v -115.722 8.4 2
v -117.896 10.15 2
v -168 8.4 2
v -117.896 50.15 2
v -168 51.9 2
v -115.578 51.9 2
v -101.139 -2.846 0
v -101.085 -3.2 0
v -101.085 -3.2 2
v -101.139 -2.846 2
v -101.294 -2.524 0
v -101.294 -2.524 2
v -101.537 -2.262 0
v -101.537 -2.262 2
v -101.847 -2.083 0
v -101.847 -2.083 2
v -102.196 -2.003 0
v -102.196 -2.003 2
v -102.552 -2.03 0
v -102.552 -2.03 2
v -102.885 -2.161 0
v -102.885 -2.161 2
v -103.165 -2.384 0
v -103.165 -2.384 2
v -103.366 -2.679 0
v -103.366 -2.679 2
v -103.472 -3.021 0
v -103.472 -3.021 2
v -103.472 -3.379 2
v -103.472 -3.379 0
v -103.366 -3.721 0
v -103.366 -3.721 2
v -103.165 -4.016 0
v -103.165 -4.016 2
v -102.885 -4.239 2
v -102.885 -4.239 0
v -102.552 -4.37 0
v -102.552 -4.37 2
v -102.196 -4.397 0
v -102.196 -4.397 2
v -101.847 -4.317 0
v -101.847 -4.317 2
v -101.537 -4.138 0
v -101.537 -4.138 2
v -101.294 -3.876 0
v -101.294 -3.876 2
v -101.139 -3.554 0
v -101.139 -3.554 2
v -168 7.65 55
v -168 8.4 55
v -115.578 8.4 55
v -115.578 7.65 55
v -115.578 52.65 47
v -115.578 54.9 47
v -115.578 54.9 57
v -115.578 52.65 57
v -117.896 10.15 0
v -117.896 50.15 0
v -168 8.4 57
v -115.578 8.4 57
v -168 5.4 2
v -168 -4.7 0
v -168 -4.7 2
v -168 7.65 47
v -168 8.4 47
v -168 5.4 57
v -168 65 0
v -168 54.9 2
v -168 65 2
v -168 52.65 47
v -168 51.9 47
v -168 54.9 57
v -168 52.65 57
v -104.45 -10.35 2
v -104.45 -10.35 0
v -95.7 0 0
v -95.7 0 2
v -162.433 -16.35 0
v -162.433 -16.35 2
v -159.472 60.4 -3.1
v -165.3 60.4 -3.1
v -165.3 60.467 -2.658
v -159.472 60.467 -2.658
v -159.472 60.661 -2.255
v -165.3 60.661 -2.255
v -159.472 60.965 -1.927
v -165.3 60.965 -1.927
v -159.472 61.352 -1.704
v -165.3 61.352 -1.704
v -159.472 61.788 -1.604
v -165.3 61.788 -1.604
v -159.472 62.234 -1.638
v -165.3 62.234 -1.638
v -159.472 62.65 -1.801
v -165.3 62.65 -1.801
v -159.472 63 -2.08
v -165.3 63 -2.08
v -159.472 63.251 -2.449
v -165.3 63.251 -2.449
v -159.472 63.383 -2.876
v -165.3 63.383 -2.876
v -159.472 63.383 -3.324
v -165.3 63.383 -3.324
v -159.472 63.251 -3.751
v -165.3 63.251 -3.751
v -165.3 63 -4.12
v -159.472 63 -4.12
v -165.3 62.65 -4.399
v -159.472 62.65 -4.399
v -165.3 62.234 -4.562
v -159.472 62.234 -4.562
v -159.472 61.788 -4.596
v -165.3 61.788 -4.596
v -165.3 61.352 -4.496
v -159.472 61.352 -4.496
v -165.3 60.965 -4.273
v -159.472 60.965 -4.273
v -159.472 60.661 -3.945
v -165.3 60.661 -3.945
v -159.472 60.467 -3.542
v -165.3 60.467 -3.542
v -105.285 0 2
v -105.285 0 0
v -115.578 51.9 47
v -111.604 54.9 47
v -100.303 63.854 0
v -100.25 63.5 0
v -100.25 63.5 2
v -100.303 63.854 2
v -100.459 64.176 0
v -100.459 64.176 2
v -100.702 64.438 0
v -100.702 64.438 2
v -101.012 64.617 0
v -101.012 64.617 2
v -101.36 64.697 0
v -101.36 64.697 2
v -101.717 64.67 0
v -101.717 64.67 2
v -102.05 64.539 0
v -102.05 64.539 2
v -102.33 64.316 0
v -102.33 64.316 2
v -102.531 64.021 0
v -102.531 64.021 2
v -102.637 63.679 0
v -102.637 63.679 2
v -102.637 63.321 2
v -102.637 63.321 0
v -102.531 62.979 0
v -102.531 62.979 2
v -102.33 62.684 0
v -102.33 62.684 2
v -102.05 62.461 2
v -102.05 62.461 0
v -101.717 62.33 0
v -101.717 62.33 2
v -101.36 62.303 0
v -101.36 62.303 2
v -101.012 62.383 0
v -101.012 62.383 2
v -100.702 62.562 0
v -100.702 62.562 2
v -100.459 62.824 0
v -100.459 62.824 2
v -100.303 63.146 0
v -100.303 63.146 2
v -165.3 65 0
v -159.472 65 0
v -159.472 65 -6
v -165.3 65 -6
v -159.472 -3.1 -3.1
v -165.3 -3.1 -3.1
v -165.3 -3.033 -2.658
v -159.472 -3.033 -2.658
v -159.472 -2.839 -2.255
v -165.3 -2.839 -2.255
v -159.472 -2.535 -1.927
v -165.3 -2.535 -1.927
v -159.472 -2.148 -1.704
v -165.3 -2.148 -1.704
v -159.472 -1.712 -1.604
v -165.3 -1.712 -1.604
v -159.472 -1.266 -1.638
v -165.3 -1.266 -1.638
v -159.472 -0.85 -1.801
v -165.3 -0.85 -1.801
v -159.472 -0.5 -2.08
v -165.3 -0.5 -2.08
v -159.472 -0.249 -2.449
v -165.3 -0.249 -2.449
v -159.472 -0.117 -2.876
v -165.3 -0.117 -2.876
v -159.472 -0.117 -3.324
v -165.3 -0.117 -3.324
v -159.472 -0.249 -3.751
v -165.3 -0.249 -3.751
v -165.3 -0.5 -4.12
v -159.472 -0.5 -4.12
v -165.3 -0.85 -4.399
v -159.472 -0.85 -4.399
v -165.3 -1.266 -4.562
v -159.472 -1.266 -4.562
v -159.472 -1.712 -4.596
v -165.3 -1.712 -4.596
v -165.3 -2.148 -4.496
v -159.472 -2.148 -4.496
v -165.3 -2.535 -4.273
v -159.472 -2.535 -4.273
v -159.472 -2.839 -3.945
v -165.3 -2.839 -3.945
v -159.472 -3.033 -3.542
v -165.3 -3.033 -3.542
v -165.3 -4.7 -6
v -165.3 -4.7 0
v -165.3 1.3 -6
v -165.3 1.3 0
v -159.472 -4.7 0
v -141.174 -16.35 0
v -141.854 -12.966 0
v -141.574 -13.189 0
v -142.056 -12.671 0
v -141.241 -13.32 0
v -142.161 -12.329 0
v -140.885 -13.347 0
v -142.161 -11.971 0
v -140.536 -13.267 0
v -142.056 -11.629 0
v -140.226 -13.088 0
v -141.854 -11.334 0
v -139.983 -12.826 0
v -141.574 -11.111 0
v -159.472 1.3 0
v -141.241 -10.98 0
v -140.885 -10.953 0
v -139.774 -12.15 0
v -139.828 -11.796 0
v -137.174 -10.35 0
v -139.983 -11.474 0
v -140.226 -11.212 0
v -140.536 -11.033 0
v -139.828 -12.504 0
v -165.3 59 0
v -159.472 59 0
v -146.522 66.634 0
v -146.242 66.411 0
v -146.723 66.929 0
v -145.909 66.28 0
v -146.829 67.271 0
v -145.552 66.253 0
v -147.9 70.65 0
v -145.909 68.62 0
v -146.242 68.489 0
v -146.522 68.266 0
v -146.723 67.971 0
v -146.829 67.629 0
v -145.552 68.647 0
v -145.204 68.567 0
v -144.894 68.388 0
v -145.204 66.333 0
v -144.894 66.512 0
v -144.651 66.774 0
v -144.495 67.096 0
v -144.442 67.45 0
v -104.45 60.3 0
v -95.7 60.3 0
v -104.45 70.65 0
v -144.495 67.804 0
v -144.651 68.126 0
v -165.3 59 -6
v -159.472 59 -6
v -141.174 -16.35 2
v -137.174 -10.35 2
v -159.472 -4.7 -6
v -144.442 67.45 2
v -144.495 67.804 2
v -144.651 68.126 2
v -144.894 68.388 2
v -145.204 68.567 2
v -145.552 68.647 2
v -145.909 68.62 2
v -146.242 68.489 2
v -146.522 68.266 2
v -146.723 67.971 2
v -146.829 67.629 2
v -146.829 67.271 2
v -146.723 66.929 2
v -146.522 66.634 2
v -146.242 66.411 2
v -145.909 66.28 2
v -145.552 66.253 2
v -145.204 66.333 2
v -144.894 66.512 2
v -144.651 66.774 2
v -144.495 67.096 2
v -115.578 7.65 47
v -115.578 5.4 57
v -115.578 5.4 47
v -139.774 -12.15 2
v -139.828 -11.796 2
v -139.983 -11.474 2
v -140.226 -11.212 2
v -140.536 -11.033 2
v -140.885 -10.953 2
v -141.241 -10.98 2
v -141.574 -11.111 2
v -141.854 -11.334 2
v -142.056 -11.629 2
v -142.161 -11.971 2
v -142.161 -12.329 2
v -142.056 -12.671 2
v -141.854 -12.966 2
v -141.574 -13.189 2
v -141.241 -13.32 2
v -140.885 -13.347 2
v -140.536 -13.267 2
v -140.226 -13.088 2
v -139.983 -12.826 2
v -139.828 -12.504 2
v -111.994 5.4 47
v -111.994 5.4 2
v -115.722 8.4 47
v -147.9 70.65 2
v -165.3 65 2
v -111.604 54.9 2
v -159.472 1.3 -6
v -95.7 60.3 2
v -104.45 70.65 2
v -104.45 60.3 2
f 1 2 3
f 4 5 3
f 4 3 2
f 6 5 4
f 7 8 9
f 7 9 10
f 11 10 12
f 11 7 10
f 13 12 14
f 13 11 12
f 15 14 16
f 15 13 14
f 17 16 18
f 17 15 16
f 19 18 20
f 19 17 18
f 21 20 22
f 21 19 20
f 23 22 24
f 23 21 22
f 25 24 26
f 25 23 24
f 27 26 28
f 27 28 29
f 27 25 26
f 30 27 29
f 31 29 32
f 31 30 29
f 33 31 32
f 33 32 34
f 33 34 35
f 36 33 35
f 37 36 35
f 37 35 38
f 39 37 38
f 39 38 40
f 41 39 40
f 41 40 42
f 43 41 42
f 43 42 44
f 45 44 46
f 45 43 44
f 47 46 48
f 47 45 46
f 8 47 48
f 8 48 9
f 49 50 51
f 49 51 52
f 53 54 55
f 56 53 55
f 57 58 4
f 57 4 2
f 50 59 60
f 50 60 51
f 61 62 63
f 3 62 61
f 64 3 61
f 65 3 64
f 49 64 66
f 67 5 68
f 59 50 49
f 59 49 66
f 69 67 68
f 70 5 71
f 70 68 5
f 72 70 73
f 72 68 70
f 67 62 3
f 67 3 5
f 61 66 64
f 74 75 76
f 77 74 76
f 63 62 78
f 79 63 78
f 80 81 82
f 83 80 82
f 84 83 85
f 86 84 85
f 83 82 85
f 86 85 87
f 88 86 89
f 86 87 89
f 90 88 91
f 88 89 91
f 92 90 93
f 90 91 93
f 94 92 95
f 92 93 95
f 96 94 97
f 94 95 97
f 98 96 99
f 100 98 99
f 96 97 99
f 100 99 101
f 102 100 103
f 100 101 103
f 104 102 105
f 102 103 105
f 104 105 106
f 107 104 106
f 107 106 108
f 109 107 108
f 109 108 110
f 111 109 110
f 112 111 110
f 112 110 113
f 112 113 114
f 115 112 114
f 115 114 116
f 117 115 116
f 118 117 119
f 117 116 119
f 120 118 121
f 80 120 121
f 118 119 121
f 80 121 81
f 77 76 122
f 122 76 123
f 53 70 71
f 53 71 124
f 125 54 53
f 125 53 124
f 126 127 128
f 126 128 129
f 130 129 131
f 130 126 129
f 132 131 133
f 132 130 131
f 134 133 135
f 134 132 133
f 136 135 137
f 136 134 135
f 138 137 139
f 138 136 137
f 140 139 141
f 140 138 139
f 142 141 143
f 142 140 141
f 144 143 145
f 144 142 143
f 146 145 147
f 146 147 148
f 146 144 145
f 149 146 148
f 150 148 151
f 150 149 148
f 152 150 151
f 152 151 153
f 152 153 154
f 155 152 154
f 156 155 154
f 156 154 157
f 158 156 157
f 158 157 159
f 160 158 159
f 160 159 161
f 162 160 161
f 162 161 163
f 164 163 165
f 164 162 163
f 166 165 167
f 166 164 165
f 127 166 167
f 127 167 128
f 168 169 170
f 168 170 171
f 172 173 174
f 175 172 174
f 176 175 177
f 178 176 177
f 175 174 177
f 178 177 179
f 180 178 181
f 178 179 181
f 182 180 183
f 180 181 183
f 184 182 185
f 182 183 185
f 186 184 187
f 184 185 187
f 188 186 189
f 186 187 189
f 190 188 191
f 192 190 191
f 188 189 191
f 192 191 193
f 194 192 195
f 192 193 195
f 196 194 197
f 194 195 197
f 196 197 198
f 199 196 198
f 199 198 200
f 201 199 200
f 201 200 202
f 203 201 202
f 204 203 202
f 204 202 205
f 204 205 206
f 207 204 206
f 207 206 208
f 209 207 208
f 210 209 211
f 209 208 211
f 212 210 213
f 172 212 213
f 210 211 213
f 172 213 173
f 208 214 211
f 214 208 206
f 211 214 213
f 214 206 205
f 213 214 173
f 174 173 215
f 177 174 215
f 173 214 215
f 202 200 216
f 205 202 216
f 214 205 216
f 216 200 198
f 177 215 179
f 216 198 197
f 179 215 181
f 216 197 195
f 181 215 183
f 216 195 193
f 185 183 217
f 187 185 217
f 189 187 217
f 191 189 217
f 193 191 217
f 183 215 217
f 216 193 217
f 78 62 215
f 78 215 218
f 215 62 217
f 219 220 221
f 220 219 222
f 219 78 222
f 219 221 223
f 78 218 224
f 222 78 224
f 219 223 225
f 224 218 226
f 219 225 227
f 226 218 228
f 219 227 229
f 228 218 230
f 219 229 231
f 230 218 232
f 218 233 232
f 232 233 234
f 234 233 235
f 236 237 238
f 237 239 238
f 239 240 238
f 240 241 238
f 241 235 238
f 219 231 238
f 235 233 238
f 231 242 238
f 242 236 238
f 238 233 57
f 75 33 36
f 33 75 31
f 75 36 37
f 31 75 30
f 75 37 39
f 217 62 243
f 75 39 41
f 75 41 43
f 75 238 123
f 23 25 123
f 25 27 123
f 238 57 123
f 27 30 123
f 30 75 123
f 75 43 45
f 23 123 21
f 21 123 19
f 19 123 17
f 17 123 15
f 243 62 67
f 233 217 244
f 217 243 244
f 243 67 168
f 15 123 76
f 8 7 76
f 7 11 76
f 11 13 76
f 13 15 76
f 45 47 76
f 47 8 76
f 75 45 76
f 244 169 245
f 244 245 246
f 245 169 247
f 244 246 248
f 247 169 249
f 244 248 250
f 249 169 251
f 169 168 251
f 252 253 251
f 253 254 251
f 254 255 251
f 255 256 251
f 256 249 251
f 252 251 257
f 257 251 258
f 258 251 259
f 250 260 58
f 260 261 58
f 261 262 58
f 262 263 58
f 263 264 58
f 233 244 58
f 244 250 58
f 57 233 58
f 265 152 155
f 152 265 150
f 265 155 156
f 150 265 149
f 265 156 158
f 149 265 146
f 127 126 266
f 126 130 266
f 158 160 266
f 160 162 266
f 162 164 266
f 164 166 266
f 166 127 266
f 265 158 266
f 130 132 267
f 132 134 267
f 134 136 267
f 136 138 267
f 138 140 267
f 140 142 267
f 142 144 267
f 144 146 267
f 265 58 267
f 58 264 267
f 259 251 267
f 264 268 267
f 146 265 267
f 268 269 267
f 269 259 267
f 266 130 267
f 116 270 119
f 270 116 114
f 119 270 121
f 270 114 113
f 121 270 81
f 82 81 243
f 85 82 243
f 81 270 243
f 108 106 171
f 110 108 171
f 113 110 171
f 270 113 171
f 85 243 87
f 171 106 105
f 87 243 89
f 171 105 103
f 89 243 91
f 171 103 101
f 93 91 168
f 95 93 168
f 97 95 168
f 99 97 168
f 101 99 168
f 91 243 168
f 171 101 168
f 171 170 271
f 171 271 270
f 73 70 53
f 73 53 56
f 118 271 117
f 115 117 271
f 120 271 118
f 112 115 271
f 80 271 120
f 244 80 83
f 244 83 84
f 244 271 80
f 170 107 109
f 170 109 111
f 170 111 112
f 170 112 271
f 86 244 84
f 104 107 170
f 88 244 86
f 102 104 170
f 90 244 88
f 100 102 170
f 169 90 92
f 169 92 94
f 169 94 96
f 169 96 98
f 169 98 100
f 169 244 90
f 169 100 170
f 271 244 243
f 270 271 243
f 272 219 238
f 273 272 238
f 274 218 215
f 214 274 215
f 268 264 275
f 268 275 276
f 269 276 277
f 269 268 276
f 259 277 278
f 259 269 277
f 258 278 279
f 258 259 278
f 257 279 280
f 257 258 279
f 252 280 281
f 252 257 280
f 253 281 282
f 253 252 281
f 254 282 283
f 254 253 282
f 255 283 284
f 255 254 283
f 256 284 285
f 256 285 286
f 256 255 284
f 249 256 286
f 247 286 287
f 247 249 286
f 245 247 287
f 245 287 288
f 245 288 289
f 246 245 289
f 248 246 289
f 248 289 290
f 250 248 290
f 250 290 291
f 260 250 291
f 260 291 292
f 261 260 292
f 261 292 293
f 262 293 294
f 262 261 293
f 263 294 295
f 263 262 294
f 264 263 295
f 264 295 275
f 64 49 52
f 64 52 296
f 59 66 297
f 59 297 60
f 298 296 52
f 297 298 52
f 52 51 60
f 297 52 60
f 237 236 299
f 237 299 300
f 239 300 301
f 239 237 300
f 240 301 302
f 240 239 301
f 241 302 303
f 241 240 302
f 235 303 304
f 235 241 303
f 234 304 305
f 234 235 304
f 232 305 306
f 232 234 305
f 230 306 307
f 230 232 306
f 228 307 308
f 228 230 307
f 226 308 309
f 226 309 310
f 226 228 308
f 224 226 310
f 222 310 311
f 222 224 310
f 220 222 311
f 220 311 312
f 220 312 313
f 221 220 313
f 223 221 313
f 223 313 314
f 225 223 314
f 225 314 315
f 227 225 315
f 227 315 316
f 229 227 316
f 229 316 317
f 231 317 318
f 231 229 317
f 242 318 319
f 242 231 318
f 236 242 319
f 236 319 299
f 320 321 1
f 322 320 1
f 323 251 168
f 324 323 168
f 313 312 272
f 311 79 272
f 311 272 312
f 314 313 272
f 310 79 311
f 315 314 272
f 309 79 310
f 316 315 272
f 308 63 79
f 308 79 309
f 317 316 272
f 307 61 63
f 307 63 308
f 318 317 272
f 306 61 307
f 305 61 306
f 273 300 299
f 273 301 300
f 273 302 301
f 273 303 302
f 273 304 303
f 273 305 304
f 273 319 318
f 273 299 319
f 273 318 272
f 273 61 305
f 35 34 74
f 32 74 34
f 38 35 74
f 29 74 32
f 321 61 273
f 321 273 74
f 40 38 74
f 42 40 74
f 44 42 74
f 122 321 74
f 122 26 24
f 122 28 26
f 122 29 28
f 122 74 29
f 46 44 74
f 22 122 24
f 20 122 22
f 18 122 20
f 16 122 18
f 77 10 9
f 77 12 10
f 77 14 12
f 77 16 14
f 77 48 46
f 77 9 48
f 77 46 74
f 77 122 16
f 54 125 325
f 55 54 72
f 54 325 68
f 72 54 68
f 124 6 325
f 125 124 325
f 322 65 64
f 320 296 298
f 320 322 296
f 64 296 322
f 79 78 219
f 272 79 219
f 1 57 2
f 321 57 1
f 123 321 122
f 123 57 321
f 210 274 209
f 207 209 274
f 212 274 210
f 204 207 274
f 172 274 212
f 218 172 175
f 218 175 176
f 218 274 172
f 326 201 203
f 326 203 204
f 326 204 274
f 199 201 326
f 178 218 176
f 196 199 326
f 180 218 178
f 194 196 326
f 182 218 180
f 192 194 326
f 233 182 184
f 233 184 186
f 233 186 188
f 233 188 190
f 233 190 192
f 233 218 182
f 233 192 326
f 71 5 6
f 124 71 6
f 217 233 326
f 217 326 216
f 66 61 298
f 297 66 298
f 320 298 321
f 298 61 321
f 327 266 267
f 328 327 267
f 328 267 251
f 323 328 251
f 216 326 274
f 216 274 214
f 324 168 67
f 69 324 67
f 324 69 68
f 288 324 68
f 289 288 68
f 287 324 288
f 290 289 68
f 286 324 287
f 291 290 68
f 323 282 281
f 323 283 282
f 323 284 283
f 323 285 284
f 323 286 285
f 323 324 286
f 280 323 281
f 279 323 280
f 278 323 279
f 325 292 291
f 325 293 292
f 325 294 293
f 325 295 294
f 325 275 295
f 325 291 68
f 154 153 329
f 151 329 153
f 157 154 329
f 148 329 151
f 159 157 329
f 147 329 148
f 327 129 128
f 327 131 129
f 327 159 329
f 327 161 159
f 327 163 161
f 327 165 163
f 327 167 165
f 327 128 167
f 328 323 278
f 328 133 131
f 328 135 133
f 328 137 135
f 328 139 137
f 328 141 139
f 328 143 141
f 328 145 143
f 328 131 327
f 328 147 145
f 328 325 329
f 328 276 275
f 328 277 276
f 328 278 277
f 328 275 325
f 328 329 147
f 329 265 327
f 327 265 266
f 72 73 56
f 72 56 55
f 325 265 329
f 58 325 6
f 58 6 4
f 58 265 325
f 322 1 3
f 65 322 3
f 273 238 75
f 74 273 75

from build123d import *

# Parameters (mm, degrees)
SKETCH_1_R          = 1.2
EXTRUDE_1_DEPTH     = 2
SKETCH_2_W          = 5.828282036
SKETCH_2_H          = 6
EXTRUDE_3_DEPTH     = 6
SKETCH_4_R          = 1.5
CUT_EXTRUDE_1_DEPTH = 5.828282036
EXTRUDE_4_DEPTH     = 45
EXTRUDE_5_DEPTH     = 52.422321


with BuildPart() as part:
    # 草图1 → 凸台-拉伸1 (new body)
    # profile 1 of 3: a face of its own
    with BuildSketch(Plane.XY):
        Polygon((-105.285311989, -8.55), (-141.174369577, -8.55), (-145.174369577, -14.55), (-161.297950566, -14.55), (-164.165207203, -8.55), (-165.3, -8.55), (-165.3, -4.7), (-168, -4.7), (-168, 65), (-165.3, 65), (-159.471717964, 65), (-149.4421323, 68.256733276), (-149.4421323, 63.85), (-141.4421323, 63.85), (-141.4421323, 68.85), (-104.45, 68.85), (-104.45, 60.3), (-117.895945033, 50.15), (-117.895945033, 10.15), (-105.285311989, 0), align=None)
    # profile 2 of 3: a face of its own
    with BuildSketch(Plane.XY):
        Polygon((-141.4421323, 63.85), (-141.4421323, 68.85), (-104.45, 68.85), (-104.45, 60.3), (-95.7, 60.3), (-104.45, 70.65), (-147.9, 70.65), (-165.3, 65), (-159.471717964, 65), (-149.4421323, 68.256733276), (-149.4421323, 63.85), align=None)
        with Locations((-101.45, 63.5)):
            Circle(SKETCH_1_R, mode=Mode.SUBTRACT)
        with Locations((-145.6421323, 67.45)):
            Circle(SKETCH_1_R, mode=Mode.SUBTRACT)
    # profile 3 of 3: a face of its own
    with BuildSketch(Plane.XY):
        Polygon((-105.285311989, 0), (-105.285311989, -8.55), (-141.174369577, -8.55), (-145.174369577, -14.55), (-161.297950566, -14.55), (-164.165207203, -8.55), (-165.3, -8.55), (-165.3, -4.7), (-168, -4.7), (-162.432743363, -16.35), (-141.174369577, -16.35), (-137.174369577, -10.35), (-104.45, -10.35), (-95.7, 0), align=None)
        with Locations((-140.974369577, -12.15)):
            Circle(SKETCH_1_R, mode=Mode.SUBTRACT)
        with Locations((-102.285311989, -3.2)):
            Circle(SKETCH_1_R, mode=Mode.SUBTRACT)
    extrude(amount=EXTRUDE_1_DEPTH)

    # 草图2 → 凸台-拉伸3 (add)
    with BuildSketch(Plane(origin=(0, 0, 0), x_dir=(-1, 0, 0), z_dir=(0, 0, -1))):
        with Locations((162.385858982, 62)):
            Rectangle(SKETCH_2_W, SKETCH_2_H)
        with Locations((162.385858982, -1.7)):
            Rectangle(SKETCH_2_W, SKETCH_2_H)
    extrude(amount=EXTRUDE_3_DEPTH)

    # 草图4 → 切除-拉伸1 (cut)
    with BuildSketch(Plane.ZY.offset(165.3)):
        with Locations(Location((-3.1, 61.9, 0), (0, 0, 270))):
            Circle(SKETCH_4_R)
        with Locations(Location((-3.1, -1.6, 0), (0, 0, 270))):
            Circle(SKETCH_4_R)
    extrude(amount=-CUT_EXTRUDE_1_DEPTH, mode=Mode.SUBTRACT)

    # 草图5 → 凸台-拉伸4 (add)
    with BuildSketch(Plane.XY.offset(2)):
        Polygon((-113, 54.9), (-168, 54.9), (-168, 51.9), (-115.577678648, 51.9), (-111.603507702, 54.9), align=None)
        Polygon((-115.721697956, 8.4), (-168, 8.4), (-168, 5.4), (-113, 5.4), (-111.994417254, 5.4), align=None)
    extrude(amount=EXTRUDE_4_DEPTH)

    # 草图6 → 凸台-拉伸5 (add)
    with BuildSketch(Plane.ZY.offset(168)):
        Polygon((47, 54.9), (47, 52.65), (55, 52.65), (57, 52.65), (57, 54.9), align=None)
        Polygon((55, 7.65), (47, 7.65), (47, 5.4), (57, 5.4), (57, 8.4), (55, 8.4), align=None)
    extrude(amount=-EXTRUDE_5_DEPTH)


solid = part.part
